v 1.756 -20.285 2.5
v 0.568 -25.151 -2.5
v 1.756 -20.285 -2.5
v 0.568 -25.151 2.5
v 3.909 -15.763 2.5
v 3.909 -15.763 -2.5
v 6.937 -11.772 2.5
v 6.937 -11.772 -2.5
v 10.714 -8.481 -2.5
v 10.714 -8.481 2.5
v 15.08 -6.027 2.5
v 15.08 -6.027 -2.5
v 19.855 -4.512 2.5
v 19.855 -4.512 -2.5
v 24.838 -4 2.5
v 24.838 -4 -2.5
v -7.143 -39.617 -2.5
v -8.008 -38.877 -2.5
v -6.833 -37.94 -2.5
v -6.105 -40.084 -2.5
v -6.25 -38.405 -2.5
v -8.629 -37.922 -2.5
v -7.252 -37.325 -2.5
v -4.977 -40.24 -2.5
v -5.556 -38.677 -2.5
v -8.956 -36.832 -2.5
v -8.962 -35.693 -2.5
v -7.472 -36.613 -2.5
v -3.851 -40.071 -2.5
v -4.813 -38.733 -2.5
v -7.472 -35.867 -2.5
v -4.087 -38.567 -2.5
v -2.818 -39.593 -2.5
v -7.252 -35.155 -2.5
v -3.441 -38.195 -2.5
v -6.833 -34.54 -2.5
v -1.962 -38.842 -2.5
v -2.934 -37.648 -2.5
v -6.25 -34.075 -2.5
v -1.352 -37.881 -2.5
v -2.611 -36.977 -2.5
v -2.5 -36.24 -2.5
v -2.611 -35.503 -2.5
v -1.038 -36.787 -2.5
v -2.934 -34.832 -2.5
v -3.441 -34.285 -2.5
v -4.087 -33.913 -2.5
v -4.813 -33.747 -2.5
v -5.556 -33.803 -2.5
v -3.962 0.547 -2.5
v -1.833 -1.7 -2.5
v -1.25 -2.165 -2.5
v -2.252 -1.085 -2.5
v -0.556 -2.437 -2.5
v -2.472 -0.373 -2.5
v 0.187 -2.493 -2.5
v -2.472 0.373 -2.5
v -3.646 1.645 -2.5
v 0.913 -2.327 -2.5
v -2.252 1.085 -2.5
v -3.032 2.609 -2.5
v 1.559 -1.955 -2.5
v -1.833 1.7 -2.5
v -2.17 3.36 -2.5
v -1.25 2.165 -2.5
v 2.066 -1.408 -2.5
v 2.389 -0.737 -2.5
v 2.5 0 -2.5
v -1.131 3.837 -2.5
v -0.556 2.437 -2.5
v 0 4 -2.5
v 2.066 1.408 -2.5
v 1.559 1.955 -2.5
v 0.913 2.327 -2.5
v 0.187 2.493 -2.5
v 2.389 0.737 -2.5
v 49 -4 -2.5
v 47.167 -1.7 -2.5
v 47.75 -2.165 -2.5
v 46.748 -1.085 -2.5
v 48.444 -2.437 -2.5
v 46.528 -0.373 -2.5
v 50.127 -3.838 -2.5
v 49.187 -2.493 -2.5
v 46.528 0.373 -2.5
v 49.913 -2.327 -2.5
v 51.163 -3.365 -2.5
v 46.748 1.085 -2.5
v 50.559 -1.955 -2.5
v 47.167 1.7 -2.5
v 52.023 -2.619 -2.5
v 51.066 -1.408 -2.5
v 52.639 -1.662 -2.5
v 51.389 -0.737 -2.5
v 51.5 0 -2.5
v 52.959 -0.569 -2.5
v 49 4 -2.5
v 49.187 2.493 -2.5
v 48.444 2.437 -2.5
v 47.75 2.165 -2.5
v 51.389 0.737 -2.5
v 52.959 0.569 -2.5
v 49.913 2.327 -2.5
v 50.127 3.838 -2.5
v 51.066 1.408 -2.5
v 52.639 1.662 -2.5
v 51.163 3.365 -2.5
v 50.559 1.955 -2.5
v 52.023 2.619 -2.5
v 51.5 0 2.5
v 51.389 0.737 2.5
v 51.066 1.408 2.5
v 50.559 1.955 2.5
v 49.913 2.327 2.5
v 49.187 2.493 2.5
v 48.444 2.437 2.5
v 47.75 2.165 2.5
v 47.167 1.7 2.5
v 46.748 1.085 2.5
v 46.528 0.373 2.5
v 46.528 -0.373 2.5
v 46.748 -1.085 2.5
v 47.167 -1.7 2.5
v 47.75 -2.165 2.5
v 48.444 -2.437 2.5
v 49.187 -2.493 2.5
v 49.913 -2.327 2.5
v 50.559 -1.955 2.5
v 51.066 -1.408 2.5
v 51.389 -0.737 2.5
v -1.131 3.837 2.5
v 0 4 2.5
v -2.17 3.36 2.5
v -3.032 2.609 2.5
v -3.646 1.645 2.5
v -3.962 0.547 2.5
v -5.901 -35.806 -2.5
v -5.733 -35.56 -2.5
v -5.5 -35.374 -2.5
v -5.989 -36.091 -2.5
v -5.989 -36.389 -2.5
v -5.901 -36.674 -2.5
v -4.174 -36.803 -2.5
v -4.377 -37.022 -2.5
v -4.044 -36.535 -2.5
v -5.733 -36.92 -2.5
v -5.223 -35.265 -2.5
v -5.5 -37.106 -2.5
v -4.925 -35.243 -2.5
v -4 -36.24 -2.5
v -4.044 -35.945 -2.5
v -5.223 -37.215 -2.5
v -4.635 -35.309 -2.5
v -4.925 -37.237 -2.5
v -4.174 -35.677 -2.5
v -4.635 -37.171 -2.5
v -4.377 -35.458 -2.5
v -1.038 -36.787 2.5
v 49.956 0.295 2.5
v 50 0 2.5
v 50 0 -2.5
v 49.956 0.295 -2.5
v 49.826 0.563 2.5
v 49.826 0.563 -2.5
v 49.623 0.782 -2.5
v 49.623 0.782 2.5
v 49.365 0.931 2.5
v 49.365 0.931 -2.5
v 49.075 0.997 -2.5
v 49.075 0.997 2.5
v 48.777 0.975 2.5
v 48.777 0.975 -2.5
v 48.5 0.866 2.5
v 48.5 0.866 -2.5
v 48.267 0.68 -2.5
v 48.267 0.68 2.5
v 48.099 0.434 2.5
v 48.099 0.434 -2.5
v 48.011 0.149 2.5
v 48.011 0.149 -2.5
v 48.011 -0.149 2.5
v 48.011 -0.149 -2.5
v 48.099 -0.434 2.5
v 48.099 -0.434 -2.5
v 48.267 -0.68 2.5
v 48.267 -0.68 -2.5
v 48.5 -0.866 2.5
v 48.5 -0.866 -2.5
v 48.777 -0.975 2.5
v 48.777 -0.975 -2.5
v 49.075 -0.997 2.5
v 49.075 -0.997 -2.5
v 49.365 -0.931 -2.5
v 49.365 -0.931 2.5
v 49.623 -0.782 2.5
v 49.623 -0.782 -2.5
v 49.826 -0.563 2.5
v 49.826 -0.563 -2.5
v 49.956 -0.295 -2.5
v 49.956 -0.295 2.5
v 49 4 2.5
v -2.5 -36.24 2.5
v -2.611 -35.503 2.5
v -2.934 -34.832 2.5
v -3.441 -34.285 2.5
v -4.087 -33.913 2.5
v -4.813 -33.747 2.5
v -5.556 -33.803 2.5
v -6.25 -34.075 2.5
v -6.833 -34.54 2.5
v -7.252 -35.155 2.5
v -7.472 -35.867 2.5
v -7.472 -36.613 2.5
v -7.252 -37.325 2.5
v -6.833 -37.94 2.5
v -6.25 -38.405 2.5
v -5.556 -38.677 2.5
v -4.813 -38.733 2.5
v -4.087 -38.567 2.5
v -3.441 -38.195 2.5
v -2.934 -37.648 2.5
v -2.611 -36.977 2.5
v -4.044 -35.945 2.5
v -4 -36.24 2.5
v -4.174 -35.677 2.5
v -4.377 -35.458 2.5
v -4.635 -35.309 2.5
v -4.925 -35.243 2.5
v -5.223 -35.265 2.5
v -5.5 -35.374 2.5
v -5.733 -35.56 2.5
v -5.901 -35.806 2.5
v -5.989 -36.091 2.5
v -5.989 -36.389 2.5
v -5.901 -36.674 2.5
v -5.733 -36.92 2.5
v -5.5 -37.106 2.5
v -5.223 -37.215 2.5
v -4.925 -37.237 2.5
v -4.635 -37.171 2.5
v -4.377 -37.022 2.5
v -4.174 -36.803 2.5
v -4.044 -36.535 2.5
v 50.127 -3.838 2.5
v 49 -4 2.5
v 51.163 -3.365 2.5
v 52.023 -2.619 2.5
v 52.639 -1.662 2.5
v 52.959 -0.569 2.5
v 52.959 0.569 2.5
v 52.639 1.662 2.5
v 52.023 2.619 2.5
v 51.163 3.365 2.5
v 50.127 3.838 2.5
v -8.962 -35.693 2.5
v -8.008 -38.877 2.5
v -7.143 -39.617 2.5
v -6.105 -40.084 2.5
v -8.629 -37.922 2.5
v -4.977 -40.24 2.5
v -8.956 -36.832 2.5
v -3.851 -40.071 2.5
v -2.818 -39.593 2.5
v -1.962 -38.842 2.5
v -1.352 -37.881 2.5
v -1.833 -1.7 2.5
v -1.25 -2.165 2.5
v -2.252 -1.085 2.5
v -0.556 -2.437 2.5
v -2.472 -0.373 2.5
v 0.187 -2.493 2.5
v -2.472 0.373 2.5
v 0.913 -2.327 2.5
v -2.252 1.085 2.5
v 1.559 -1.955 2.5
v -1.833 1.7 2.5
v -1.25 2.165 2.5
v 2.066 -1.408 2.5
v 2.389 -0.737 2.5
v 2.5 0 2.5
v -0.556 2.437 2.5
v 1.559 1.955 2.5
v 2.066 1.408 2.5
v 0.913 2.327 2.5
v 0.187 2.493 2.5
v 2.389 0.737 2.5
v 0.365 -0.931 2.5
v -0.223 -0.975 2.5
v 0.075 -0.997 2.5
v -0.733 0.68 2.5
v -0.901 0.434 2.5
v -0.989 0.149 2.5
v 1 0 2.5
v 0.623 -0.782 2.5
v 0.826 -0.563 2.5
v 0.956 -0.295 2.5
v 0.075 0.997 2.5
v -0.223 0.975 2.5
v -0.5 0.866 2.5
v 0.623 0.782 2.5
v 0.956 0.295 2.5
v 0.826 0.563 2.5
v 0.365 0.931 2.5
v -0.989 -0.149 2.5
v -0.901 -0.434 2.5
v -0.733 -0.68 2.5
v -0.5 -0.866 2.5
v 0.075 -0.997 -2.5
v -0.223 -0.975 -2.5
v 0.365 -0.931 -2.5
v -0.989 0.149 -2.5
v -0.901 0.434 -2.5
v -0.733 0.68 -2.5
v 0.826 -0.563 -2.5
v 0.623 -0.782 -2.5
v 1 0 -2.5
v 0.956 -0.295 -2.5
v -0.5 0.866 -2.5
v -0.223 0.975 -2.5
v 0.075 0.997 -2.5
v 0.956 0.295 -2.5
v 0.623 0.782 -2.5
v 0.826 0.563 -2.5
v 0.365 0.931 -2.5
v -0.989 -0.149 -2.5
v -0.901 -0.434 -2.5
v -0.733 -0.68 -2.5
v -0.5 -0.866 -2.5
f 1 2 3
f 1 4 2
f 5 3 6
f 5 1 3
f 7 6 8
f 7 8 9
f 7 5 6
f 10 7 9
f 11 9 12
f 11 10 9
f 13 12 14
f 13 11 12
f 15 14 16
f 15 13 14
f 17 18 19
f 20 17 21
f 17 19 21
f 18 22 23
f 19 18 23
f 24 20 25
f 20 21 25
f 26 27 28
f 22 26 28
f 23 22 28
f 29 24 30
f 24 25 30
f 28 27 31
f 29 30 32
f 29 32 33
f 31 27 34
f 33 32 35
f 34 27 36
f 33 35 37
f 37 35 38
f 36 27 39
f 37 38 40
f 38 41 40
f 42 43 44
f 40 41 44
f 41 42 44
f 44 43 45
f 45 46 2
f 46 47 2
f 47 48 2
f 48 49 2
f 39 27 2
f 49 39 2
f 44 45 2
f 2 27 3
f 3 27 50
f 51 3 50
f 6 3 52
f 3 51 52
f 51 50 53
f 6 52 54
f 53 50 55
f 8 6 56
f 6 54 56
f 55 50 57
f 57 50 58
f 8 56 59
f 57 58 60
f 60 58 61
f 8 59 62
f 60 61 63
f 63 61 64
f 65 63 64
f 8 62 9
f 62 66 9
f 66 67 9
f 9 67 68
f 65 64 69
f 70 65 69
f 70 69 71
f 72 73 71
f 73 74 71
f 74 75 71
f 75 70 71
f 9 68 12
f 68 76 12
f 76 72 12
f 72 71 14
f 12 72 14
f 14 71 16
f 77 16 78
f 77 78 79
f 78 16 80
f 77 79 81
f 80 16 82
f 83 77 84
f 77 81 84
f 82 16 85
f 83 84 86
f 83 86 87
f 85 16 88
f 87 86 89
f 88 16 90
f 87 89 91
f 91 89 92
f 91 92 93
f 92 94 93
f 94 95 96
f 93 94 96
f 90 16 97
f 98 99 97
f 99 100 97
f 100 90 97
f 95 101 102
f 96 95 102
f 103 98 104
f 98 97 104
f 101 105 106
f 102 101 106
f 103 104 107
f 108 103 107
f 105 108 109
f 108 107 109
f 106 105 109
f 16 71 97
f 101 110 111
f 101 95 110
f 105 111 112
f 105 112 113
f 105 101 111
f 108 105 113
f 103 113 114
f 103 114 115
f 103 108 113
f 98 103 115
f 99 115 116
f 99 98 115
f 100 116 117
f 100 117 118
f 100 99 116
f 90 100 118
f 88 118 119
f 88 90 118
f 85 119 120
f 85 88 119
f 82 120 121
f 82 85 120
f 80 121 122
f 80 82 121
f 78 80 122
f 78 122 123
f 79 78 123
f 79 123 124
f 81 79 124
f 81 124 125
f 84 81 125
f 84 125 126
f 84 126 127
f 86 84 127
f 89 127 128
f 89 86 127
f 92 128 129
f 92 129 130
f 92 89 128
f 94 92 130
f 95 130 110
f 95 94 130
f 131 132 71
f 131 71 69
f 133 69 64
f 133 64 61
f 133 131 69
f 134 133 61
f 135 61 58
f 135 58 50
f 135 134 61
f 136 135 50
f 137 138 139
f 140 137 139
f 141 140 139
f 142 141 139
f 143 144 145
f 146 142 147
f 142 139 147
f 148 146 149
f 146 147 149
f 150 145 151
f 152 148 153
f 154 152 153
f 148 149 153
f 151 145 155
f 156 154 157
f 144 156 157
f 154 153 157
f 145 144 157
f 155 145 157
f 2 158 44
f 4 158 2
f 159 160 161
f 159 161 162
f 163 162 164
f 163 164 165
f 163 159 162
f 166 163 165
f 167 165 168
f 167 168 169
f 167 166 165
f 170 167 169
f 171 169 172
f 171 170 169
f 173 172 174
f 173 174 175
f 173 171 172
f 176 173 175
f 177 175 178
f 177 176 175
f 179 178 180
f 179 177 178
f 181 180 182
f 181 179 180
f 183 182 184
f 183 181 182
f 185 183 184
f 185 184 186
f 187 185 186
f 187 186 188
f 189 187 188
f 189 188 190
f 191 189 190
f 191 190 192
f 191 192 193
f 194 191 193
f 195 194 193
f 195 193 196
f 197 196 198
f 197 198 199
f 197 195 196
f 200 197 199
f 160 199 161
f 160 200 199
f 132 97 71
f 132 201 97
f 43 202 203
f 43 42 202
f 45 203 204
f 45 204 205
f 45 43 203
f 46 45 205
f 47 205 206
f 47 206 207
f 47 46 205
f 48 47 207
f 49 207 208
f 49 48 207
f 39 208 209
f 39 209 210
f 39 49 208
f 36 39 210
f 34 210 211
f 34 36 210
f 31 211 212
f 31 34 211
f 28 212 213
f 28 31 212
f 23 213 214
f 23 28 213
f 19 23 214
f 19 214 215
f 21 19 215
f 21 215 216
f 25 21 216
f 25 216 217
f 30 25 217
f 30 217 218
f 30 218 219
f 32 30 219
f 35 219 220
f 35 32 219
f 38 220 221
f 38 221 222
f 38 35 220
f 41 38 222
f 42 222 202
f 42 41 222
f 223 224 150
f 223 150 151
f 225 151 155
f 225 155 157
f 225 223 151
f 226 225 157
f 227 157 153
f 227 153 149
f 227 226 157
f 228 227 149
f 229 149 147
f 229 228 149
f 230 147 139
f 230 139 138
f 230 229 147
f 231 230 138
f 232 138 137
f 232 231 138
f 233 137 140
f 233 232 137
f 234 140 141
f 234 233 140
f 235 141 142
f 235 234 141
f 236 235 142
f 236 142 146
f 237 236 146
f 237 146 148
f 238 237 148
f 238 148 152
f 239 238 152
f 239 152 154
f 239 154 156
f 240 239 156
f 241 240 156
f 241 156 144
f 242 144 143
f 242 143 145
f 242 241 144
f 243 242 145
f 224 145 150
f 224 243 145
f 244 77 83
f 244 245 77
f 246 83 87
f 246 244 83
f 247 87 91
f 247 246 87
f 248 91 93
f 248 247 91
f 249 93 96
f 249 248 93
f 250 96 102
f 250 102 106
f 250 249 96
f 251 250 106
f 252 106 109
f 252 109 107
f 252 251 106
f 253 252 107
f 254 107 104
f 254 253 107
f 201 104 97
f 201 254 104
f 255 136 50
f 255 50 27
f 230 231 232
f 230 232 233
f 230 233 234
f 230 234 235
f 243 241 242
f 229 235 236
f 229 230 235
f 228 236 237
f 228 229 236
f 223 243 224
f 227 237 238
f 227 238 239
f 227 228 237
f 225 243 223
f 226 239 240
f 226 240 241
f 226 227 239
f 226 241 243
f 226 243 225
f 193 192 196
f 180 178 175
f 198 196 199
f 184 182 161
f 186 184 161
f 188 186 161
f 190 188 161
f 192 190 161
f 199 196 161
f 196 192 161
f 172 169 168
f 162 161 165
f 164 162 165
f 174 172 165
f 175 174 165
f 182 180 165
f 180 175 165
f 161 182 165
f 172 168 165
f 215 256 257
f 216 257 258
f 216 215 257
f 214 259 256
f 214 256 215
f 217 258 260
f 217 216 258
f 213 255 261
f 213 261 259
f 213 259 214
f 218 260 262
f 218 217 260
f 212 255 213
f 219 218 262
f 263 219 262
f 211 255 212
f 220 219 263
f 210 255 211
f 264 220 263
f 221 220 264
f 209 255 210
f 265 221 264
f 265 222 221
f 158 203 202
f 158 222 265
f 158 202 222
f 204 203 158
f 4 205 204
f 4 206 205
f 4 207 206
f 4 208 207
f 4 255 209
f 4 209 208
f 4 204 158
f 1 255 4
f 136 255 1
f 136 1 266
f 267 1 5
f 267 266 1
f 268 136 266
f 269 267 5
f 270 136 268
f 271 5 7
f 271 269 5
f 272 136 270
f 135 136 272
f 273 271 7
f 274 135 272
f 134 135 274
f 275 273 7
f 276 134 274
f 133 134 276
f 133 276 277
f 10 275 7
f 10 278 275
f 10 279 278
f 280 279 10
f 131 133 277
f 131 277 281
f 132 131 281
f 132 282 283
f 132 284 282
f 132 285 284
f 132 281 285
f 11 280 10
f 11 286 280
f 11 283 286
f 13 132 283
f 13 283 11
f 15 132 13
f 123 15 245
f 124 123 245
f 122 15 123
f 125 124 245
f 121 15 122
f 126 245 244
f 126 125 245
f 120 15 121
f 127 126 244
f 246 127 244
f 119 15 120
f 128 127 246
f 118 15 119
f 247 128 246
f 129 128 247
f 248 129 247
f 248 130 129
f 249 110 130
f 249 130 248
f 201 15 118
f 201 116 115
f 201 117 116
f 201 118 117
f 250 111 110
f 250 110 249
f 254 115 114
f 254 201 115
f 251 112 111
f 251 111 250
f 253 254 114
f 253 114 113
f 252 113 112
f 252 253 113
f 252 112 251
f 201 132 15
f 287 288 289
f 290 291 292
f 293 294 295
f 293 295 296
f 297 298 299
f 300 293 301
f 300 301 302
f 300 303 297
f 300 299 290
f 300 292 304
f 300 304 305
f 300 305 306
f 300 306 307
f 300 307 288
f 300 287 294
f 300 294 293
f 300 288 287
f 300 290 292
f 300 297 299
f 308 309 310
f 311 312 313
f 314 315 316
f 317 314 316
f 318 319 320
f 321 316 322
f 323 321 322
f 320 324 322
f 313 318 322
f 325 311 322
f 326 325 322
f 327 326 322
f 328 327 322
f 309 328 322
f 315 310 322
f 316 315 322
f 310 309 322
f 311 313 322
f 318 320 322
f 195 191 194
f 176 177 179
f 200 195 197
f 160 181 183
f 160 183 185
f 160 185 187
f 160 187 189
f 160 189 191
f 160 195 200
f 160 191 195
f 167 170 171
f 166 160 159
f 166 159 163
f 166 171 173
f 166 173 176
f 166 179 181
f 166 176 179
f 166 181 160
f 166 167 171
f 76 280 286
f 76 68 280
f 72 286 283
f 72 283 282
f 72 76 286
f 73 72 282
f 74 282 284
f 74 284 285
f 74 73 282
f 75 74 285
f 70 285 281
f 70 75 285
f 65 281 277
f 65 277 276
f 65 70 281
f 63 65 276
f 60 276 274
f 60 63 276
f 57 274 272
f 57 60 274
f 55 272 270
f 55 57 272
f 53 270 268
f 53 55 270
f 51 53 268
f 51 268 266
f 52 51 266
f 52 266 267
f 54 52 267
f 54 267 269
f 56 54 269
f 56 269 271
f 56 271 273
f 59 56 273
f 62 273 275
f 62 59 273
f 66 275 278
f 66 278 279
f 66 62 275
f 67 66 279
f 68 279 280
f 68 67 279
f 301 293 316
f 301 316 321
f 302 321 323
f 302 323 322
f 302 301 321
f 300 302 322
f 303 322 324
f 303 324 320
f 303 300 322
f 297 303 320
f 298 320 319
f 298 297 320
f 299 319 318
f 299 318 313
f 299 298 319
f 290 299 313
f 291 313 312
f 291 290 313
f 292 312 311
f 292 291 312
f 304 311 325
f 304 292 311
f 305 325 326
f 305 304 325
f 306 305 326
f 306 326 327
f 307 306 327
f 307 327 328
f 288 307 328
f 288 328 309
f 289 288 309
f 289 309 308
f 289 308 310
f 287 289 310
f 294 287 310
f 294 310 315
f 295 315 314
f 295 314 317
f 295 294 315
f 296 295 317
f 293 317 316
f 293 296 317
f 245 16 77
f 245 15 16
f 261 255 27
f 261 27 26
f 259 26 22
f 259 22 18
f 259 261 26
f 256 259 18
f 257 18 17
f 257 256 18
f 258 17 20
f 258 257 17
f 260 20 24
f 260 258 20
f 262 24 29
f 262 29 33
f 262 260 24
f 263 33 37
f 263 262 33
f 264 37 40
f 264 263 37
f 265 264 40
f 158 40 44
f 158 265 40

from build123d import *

# Parameters (mm, degrees)
F0_R     = 2.5
F1_DEPTH = 2.5
F2_R     = 1
F3_DEPTH = 5


with BuildPart() as f1:
    # F0 (on Top) → F1 (new body, symmetric)
    with BuildSketch(Plane.XY):
        with BuildLine():
            Line((49, 4), (0, 4))
            ThreePointArc((0, 4), (-2.628042, 3.015526), (-3.962464, 0.546698))
            Line((-3.962464, 0.546698), (-8.962464, -35.693302))
            ThreePointArc((-8.962464, -35.693302), (-5.546698, -40.202464), (-1.037536, -36.786698))
            Line((-1.037536, -36.786698), (0.567765, -25.151477))
            ThreePointArc((0.567765, -25.151477), (8.7411, -10.029905), (24.837858, -4))
            Line((24.837858, -4), (49, -4))
            ThreePointArc((49, -4), (53, 0), (49, 4))
        make_face()
        with Locations((-5, -36.24)):
            Circle(F0_R, mode=Mode.SUBTRACT)
        Circle(F0_R, mode=Mode.SUBTRACT)
        with Locations((49, 0)):
            Circle(F0_R, mode=Mode.SUBTRACT)
    extrude(amount=F1_DEPTH, both=True)


with BuildPart() as f3:
    # F2 (on face) → F3 (new body)
    with BuildSketch(Plane.XY.offset(2.5)):
        Circle(F2_R)
        with Locations((-5, -36.24)):
            Circle(F2_R)
        with Locations((49, 0)):
            Circle(F2_R)
    extrude(amount=-F3_DEPTH)


solid = Compound([f1.part, f3.part])
